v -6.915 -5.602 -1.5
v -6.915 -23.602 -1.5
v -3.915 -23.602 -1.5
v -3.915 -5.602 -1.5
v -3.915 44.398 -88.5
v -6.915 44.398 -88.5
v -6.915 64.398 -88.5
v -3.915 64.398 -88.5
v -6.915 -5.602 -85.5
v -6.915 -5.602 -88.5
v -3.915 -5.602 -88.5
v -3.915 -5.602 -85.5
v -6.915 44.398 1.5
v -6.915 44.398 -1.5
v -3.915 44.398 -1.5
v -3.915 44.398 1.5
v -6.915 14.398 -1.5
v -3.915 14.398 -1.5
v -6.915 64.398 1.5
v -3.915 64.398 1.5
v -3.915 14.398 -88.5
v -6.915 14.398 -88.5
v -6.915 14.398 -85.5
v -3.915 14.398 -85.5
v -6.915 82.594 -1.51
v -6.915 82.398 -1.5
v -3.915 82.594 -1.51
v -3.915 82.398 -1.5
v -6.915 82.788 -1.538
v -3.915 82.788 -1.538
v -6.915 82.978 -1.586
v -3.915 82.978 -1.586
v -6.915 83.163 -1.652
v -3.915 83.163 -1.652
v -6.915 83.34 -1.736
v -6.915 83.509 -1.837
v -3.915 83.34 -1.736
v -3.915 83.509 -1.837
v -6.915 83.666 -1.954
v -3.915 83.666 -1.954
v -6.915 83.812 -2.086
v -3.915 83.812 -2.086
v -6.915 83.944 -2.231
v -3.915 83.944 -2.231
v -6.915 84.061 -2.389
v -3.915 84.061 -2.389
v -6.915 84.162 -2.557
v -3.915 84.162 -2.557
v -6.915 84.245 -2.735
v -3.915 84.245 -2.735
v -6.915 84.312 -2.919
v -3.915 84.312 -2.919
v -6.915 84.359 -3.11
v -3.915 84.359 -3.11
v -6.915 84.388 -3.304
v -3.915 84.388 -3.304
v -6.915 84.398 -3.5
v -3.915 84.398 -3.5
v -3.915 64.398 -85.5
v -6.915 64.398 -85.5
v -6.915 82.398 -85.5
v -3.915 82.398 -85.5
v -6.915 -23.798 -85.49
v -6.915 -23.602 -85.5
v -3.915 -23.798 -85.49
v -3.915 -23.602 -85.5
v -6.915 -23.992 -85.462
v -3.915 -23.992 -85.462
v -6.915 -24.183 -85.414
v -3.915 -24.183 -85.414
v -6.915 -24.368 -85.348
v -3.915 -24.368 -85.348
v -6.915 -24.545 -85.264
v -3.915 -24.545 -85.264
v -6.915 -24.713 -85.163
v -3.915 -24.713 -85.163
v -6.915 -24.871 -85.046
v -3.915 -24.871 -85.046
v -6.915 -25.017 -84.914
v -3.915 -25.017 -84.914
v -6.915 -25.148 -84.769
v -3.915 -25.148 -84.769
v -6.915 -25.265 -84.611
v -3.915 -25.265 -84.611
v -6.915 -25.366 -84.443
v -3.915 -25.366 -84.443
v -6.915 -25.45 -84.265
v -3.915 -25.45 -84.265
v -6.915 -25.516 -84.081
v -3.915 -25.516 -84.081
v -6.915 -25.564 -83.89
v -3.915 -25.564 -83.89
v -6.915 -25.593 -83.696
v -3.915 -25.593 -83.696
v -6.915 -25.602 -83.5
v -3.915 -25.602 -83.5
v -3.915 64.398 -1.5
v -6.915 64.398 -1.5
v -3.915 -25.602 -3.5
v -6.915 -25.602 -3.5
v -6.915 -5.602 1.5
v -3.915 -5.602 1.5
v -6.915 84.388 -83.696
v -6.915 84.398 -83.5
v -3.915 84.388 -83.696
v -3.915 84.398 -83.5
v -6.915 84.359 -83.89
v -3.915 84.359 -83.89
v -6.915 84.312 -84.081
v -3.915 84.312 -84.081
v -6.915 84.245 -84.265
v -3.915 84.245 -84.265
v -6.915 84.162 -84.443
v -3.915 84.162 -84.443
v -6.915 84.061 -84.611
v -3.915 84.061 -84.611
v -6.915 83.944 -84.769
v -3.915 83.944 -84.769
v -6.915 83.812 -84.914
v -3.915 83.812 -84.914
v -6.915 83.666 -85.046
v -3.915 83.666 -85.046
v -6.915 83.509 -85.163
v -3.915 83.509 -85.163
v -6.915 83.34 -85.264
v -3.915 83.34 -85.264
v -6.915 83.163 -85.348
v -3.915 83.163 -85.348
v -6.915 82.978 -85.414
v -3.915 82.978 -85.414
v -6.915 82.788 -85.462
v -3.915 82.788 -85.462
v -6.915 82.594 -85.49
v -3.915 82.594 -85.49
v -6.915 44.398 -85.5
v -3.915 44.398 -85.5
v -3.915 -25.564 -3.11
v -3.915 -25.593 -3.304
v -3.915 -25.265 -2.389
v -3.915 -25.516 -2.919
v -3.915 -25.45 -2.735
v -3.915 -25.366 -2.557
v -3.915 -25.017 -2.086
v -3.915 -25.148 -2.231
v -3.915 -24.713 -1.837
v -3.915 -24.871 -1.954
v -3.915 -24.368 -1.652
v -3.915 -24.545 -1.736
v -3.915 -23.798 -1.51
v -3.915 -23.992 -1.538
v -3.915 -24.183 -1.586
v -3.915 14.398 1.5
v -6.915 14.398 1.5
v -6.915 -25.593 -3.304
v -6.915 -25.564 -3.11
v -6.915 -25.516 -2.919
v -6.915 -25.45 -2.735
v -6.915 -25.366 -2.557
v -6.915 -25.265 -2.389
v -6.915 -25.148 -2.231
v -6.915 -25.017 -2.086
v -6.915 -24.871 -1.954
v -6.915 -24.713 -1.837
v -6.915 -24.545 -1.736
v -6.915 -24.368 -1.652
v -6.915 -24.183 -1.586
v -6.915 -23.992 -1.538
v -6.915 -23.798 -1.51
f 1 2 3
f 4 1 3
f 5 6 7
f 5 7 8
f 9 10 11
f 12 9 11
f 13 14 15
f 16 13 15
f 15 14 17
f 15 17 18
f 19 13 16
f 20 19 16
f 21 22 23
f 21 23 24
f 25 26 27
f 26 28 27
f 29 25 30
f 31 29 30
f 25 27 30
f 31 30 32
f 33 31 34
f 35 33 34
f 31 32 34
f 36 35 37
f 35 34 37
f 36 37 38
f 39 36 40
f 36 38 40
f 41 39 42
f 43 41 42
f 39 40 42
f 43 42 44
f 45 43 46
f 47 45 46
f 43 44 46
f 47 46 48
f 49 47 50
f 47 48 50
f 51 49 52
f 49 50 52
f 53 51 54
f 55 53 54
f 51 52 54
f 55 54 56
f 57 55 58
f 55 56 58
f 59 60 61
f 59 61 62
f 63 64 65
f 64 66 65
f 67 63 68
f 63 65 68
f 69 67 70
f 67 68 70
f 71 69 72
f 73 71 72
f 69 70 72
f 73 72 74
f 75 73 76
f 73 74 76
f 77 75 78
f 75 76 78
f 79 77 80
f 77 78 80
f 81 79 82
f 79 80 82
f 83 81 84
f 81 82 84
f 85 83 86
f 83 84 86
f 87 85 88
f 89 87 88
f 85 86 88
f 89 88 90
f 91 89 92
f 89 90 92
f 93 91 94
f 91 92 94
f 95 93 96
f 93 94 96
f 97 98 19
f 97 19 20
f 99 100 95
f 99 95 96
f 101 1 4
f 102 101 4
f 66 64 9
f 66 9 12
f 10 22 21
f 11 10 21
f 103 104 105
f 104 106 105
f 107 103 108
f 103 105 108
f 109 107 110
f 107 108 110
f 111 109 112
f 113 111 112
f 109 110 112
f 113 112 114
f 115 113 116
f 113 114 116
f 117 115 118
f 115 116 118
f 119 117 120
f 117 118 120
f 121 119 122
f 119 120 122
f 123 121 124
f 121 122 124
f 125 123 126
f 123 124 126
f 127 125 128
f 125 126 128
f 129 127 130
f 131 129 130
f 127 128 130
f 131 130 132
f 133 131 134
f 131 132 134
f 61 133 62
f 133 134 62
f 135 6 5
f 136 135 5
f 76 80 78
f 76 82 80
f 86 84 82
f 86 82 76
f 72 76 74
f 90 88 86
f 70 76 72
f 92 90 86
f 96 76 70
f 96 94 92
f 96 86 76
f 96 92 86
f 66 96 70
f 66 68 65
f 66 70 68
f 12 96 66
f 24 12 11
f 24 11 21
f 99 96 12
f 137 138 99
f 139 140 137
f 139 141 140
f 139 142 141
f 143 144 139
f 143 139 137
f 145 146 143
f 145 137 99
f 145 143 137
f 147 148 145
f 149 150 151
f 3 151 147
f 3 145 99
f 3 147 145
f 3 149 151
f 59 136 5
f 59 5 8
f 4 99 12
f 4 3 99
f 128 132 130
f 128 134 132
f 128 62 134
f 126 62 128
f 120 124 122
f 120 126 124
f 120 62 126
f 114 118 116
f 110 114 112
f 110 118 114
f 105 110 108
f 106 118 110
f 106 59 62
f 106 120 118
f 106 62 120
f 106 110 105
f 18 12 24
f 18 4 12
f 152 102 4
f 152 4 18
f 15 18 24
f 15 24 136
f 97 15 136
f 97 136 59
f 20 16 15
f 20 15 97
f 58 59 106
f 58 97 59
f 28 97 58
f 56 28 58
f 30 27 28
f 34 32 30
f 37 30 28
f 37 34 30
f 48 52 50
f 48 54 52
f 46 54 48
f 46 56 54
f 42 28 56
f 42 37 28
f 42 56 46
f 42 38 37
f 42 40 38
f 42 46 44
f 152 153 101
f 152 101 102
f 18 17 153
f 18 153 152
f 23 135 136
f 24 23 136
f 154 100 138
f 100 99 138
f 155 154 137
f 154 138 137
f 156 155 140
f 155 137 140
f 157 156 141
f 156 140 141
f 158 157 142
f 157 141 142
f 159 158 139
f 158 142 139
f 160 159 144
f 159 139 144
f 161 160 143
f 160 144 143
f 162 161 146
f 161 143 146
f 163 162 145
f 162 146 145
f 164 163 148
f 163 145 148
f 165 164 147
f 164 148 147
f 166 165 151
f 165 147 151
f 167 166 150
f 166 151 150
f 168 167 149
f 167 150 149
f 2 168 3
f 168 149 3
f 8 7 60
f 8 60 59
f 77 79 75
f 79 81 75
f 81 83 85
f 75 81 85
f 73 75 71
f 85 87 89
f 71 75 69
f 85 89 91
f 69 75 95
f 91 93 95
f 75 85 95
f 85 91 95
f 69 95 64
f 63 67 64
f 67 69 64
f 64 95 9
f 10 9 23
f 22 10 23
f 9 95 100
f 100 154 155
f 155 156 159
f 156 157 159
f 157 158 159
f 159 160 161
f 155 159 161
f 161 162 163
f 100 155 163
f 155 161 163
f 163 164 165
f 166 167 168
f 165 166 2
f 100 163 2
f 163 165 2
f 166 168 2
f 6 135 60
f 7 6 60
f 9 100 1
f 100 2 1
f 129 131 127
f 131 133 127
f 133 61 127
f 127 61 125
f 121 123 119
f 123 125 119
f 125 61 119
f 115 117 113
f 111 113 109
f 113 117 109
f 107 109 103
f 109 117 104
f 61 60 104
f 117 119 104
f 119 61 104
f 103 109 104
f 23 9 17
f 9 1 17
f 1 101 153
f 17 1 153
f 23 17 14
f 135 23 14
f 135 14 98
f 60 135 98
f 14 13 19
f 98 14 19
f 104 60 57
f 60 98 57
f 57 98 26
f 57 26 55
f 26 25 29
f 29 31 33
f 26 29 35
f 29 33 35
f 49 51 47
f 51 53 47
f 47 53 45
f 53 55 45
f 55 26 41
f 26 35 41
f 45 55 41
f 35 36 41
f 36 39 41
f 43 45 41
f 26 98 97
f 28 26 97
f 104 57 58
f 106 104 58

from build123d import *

# Parameters (mm, degrees)
SKETCH1_W           = 3
SKETCH1_H           = 110
EXTRUDE_THIN1_DEPTH = 90
CAVITY1_START       = 14.397705985
CAVITY1_OUTLINE_W   = 3
CAVITY1_OUTLINE_H   = 3
CAVITY1_DEPTH       = 30
CAVITY1_START_2     = -25.602294015
CAVITY1_2_OUTLINE_W = 3
CAVITY1_2_OUTLINE_H = 3
CAVITY1_2_DEPTH     = 20
CAVITY1_START_3     = 64.397705985
CAVITY1_3_OUTLINE_W = 3
CAVITY1_3_OUTLINE_H = 3
CAVITY1_3_DEPTH     = 20
FILLET1_R           = 2


# Read off the part's stored shape, not the designer's step: Cavity1
with BuildPart() as part:
    # Sketch1 → Extrude-Thin1 (new body)
    with BuildSketch(Plane.XY.offset(1.5)):
        with Locations((-5.414893617, 29.397705985)):
            Rectangle(SKETCH1_W, SKETCH1_H)
    extrude(amount=-EXTRUDE_THIN1_DEPTH)

    # Cavity1 outline → Cavity1 (cut)
    with BuildSketch(Plane(origin=(0, 0, 0), x_dir=(1, 0, 0), z_dir=(0, 1, 0)).offset(CAVITY1_START)):
        with Locations((-5.414893617, 87)):
            Rectangle(CAVITY1_OUTLINE_W, CAVITY1_OUTLINE_H)
        with Locations((-5.414893617, 0)):
            Rectangle(CAVITY1_OUTLINE_W, CAVITY1_OUTLINE_H)
    extrude(amount=CAVITY1_DEPTH, mode=Mode.SUBTRACT)

    # Cavity1 2 outline → Cavity1 2 (cut)
    with BuildSketch(Plane(origin=(0, 0, 0), x_dir=(1, 0, 0), z_dir=(0, 1, 0)).offset(CAVITY1_START_2)):
        with Locations((-5.414893617, 87)):
            Rectangle(CAVITY1_2_OUTLINE_W, CAVITY1_2_OUTLINE_H)
        with Locations((-5.414893617, 0)):
            Rectangle(CAVITY1_2_OUTLINE_W, CAVITY1_2_OUTLINE_H)
    extrude(amount=CAVITY1_2_DEPTH, mode=Mode.SUBTRACT)

    # Cavity1 3 outline → Cavity1 3 (cut)
    with BuildSketch(Plane(origin=(0, 0, 0), x_dir=(1, 0, 0), z_dir=(0, 1, 0)).offset(CAVITY1_START_3)):
        with Locations((-5.414893617, 87)):
            Rectangle(CAVITY1_3_OUTLINE_W, CAVITY1_3_OUTLINE_H)
        with Locations((-5.414893617, 0)):
            Rectangle(CAVITY1_3_OUTLINE_W, CAVITY1_3_OUTLINE_H)
    extrude(amount=CAVITY1_3_DEPTH, mode=Mode.SUBTRACT)

    # Fillet1
    fillet1_edges = [part.edges().sort_by_distance(p)[0] for p in [
        (-5.414893617, -25.602294015, -85.5),
        (-5.414893617, 84.397705985, -85.5),
        (-5.414893617, -25.602294015, -1.5),
        (-5.414893617, 84.397705985, -1.5),
    ]]
    fillet(fillet1_edges, radius=FILLET1_R)


solid = part.part
